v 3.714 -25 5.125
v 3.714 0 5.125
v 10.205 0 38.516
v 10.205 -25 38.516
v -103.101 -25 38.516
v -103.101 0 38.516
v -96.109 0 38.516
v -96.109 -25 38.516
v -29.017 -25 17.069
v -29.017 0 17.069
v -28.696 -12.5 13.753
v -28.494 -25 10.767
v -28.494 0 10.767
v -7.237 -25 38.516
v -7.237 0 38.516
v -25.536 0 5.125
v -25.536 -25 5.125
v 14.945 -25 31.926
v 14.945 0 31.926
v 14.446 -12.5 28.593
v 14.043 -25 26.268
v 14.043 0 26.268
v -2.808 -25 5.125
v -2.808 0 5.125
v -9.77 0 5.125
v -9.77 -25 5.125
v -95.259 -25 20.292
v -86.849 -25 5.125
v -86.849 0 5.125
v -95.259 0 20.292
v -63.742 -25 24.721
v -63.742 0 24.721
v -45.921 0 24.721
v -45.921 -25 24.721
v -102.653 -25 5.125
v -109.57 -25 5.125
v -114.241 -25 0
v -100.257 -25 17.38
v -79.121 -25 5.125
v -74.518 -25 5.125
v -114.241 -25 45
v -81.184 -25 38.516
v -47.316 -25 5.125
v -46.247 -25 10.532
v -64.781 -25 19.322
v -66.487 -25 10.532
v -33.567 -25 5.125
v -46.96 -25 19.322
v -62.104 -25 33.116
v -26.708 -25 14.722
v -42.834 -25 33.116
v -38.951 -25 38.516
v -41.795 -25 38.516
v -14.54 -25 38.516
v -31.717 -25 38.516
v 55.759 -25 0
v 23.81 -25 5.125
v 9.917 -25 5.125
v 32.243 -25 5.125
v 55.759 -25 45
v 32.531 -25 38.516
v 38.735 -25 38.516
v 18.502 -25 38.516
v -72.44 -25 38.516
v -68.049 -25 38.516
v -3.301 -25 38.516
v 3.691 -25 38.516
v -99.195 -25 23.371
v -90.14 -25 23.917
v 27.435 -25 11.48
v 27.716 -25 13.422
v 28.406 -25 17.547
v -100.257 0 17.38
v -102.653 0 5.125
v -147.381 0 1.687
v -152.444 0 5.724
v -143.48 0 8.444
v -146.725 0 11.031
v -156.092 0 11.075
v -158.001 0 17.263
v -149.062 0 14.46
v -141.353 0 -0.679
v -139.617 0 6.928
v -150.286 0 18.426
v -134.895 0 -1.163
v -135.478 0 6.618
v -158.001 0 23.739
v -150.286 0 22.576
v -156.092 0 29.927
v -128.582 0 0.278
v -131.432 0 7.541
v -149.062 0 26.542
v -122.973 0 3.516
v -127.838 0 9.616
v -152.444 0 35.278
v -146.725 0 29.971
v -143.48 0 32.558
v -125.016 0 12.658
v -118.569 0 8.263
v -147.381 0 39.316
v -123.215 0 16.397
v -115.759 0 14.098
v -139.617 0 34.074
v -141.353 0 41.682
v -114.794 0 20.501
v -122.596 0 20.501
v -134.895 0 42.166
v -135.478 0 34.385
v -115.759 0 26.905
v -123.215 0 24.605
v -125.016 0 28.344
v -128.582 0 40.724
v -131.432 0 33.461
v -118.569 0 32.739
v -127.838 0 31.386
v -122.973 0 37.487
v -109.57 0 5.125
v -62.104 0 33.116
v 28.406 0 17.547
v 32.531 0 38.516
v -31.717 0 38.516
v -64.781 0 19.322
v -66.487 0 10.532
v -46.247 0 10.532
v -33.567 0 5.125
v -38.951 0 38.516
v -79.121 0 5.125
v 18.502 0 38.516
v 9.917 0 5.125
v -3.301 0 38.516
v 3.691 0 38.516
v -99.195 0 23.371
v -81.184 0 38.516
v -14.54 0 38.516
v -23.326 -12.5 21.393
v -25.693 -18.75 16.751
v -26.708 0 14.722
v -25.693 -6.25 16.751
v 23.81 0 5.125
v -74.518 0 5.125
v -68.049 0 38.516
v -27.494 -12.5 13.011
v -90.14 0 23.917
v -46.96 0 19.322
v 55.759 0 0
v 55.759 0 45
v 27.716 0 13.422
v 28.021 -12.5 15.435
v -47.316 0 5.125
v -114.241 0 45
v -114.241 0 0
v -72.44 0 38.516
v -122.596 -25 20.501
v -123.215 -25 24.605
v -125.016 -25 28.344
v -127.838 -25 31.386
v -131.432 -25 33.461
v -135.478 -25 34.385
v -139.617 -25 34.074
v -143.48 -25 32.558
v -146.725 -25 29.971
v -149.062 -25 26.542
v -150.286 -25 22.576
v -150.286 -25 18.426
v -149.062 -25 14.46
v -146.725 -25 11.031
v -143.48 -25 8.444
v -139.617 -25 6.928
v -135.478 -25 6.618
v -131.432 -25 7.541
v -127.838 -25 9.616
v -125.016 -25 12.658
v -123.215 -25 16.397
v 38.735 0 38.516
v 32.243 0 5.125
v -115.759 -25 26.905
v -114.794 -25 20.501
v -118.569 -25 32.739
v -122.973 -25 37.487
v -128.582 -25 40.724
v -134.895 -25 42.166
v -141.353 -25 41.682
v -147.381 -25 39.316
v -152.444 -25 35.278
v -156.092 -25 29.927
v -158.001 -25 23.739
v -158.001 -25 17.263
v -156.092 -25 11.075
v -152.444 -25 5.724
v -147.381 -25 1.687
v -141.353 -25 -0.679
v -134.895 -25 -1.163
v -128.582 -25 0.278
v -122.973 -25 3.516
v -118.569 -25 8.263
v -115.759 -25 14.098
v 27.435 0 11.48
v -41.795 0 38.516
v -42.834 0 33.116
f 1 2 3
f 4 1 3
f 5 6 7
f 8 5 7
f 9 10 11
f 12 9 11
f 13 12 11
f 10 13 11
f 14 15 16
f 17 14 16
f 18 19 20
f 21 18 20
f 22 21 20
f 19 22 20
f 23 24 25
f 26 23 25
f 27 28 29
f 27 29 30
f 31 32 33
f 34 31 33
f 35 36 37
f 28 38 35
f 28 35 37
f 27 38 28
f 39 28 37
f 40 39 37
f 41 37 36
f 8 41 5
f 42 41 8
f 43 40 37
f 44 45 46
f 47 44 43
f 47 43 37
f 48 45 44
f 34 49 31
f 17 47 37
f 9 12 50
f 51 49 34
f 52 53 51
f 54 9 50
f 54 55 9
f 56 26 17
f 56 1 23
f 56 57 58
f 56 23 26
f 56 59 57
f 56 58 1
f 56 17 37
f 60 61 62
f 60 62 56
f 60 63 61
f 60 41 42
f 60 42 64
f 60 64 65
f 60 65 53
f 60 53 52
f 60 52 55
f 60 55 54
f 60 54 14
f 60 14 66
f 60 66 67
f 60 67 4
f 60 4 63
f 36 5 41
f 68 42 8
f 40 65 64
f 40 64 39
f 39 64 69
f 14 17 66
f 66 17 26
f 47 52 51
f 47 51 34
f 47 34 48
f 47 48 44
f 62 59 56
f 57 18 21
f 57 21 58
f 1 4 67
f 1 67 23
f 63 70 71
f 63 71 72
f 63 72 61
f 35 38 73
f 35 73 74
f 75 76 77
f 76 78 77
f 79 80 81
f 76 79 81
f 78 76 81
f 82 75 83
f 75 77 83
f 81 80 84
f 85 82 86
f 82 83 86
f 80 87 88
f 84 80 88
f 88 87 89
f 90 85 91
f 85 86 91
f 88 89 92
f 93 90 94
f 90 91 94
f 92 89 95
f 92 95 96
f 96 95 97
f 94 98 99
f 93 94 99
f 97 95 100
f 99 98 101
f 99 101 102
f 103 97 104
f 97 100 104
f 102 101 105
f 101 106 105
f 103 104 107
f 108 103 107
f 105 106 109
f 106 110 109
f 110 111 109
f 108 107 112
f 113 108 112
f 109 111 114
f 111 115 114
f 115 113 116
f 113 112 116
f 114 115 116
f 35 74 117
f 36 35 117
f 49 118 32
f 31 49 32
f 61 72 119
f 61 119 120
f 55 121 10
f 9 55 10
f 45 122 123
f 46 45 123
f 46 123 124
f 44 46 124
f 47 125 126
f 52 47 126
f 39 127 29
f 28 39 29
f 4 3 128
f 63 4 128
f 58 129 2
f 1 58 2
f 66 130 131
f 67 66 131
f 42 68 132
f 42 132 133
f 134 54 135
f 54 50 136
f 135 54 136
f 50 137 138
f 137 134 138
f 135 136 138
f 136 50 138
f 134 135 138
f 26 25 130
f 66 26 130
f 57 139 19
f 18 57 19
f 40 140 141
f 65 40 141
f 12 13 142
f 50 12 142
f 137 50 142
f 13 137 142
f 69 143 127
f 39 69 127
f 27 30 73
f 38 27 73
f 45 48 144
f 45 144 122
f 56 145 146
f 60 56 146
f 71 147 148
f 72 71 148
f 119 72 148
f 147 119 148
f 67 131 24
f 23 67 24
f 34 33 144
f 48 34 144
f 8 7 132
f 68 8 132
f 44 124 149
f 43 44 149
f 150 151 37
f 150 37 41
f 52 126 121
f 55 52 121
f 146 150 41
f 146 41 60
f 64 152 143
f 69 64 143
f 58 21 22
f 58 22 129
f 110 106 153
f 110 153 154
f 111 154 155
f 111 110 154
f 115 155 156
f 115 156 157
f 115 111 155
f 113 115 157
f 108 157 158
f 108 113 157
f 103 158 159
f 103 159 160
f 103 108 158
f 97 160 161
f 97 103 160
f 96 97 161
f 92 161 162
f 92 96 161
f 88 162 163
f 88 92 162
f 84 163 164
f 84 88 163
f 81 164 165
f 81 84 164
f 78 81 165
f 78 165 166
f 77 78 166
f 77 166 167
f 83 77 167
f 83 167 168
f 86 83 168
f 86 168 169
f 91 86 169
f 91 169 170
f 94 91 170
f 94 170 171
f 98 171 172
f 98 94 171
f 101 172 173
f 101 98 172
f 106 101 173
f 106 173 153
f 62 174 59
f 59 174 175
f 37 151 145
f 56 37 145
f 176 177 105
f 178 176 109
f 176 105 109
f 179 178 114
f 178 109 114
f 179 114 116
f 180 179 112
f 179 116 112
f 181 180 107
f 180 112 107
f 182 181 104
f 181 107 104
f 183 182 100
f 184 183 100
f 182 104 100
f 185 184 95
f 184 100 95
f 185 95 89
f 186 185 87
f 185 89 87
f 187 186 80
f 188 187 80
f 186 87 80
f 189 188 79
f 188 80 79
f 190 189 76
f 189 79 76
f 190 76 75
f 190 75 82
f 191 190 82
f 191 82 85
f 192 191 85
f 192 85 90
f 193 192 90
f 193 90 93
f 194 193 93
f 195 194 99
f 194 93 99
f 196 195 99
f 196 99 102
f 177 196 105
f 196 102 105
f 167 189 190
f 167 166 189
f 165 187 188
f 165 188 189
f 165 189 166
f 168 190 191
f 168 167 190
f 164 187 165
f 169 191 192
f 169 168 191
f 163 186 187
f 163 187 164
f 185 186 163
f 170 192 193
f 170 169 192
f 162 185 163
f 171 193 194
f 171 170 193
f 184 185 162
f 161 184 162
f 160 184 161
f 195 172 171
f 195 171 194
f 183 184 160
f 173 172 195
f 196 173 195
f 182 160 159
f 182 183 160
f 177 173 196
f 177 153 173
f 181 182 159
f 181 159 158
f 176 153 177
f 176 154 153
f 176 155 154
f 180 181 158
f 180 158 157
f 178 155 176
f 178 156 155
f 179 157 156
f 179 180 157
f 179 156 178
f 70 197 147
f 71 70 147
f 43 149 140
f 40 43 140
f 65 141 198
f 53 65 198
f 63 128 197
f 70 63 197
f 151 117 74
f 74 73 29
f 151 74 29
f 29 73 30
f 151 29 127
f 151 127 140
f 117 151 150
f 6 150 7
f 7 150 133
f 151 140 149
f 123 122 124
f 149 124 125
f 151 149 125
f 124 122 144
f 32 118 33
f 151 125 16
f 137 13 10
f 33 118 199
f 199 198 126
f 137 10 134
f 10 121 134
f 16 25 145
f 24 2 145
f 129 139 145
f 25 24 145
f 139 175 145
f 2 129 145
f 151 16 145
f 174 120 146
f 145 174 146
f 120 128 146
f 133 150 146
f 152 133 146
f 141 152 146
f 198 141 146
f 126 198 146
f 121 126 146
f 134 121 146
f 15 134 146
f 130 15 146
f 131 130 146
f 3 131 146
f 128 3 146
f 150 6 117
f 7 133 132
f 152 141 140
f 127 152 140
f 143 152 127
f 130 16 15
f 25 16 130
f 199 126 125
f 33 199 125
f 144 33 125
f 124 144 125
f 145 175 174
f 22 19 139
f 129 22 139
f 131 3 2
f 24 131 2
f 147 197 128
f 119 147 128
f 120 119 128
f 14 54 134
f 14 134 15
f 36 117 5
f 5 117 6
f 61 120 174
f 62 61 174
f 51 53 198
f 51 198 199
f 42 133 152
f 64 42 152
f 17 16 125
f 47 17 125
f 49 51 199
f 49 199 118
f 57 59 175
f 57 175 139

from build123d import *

# Parameters (mm, degrees)
F0_W     = 170
F0_H     = 45
F1_DEPTH = 25
F0_R     = 21.7251346757
F0_R_2   = 13.9223950692


with BuildPart() as f1:
    # F0 (on Front) → F1 (new body)
    with BuildSketch(Plane.XZ):
        with Locations((-29.2414551138, 22.5)):
            Rectangle(F0_W, F0_H)
        Polygon((-79.1214853234, 5.125280004), (-86.849139698, 5.125280004), (-95.2593150675, 20.2924132221), (-100.2568854628, 17.3803236442), (-102.6532925113, 5.125280004), (-109.5695052588, 5.125280004), (-103.1007229412, 38.5157237837), (-96.1086745277, 38.5157237837), (-99.1951861376, 23.3713412654), (-81.1842154411, 38.5157237837), (-72.4403631408, 38.5157237837), (-90.1404076064, 23.9173580612), align=None, mode=Mode.SUBTRACT)
        Polygon((-47.316006965, 5.125280004), (-74.5182603917, 5.125280004), (-68.0494780742, 38.5157237837), (-41.7951704737, 38.5157237837), (-42.8341190991, 33.116224358), (-62.1039618527, 33.116224358), (-63.7420122403, 24.7212161218), (-45.920630709, 24.7212161218), (-46.9595793344, 19.3217166961), (-64.7809608657, 19.3217166961), (-66.4872633527, 10.5323629962), (-46.2467240732, 10.5323629962), align=None, mode=Mode.SUBTRACT)
        with BuildLine():
            Line((-7.2368574362, 38.5157237837), (-25.5360036638, 5.125280004))
            Line((-25.5360036638, 5.125280004), (-33.5670007028, 5.125280004))
            Line((-33.5670007028, 5.125280004), (-38.9513329953, 38.5157237837))
            Line((-38.9513329953, 38.5157237837), (-31.7166104502, 38.5157237837))
            Line((-31.7166104502, 38.5157237837), (-29.0168607374, 17.0693974133))
            add(Edge.make_bspline(
                [(-29.0168607374, 17.0693974133), (-28.637682407, 13.5885403397), (-28.4935946414, 10.7674535611)],
                knots=[0, 0, 0, 1, 1, 1], degree=2))
            add(Edge.make_bspline(
                [(-28.4935946414, 10.7674535611), (-27.3863939165, 13.2776141087), (-26.7076647049, 14.7222835478)],
                knots=[0, 0, 0, 1, 1, 1], degree=2))
            add(Edge.make_bspline(
                [(-26.7076647049, 14.7222835478), (-26.0289354934, 16.1669529868), (-14.5398320807, 38.5157237837)],
                knots=[0, 0, 0, 1, 1, 1], degree=2))
            Line((-14.5398320807, 38.5157237837), (-7.2368574362, 38.5157237837))
        make_face(mode=Mode.SUBTRACT)
        Polygon((-2.8080545365, 5.125280004), (-9.7697686836, 5.125280004), (-3.3009863661, 38.5157237837), (3.6910620474, 38.5157237837), align=None, mode=Mode.SUBTRACT)
        with BuildLine():
            Line((32.2431903305, 5.125280004), (23.8102642613, 5.125280004))
            Line((23.8102642613, 5.125280004), (14.9450748953, 31.9256044004))
            add(Edge.make_bspline(
                [(14.9450748953, 31.9256044004), (14.3990580994, 28.0883196962), (14.0426304688, 26.26826371)],
                knots=[0, 0, 0, 1, 1, 1], degree=2))
            Line((14.0426304688, 26.26826371), (9.9171702335, 5.125280004))
            Line((9.9171702335, 5.125280004), (3.7138127473, 5.125280004))
            Line((3.7138127473, 5.125280004), (10.2053457646, 38.5157237837))
            Line((10.2053457646, 38.5157237837), (18.5017676349, 38.5157237837))
            Line((18.5017676349, 38.5157237837), (27.4352091004, 11.4803088224))
            Line((27.4352091004, 11.4803088224), (27.7158010649, 13.4217018743))
            add(Edge.make_bspline(
                [(27.7158010649, 13.4217018743), (27.9812258962, 15.385845626), (28.4059056263, 17.5471621096)],
                knots=[0, 0, 0, 1, 1, 1], degree=2))
            Line((28.4059056263, 17.5471621096), (32.5313658617, 38.5157237837))
            Line((32.5313658617, 38.5157237837), (38.7347233479, 38.5157237837))
            Line((38.7347233479, 38.5157237837), (32.2431903305, 5.125280004))
        make_face(mode=Mode.SUBTRACT)
    extrude(amount=F1_DEPTH)


with BuildPart() as f1b:
    # F0 (on Front) → F1, piece 2 (new body)
    with BuildSketch(Plane.XZ):
        with Locations((-136.5187764168, 20.501114428)):
            Circle(F0_R)
        with Locations((-136.5187764168, 20.501114428)):
            Circle(F0_R_2, mode=Mode.SUBTRACT)
    extrude(amount=F1_DEPTH)


solid = Compound([f1.part, f1b.part])
